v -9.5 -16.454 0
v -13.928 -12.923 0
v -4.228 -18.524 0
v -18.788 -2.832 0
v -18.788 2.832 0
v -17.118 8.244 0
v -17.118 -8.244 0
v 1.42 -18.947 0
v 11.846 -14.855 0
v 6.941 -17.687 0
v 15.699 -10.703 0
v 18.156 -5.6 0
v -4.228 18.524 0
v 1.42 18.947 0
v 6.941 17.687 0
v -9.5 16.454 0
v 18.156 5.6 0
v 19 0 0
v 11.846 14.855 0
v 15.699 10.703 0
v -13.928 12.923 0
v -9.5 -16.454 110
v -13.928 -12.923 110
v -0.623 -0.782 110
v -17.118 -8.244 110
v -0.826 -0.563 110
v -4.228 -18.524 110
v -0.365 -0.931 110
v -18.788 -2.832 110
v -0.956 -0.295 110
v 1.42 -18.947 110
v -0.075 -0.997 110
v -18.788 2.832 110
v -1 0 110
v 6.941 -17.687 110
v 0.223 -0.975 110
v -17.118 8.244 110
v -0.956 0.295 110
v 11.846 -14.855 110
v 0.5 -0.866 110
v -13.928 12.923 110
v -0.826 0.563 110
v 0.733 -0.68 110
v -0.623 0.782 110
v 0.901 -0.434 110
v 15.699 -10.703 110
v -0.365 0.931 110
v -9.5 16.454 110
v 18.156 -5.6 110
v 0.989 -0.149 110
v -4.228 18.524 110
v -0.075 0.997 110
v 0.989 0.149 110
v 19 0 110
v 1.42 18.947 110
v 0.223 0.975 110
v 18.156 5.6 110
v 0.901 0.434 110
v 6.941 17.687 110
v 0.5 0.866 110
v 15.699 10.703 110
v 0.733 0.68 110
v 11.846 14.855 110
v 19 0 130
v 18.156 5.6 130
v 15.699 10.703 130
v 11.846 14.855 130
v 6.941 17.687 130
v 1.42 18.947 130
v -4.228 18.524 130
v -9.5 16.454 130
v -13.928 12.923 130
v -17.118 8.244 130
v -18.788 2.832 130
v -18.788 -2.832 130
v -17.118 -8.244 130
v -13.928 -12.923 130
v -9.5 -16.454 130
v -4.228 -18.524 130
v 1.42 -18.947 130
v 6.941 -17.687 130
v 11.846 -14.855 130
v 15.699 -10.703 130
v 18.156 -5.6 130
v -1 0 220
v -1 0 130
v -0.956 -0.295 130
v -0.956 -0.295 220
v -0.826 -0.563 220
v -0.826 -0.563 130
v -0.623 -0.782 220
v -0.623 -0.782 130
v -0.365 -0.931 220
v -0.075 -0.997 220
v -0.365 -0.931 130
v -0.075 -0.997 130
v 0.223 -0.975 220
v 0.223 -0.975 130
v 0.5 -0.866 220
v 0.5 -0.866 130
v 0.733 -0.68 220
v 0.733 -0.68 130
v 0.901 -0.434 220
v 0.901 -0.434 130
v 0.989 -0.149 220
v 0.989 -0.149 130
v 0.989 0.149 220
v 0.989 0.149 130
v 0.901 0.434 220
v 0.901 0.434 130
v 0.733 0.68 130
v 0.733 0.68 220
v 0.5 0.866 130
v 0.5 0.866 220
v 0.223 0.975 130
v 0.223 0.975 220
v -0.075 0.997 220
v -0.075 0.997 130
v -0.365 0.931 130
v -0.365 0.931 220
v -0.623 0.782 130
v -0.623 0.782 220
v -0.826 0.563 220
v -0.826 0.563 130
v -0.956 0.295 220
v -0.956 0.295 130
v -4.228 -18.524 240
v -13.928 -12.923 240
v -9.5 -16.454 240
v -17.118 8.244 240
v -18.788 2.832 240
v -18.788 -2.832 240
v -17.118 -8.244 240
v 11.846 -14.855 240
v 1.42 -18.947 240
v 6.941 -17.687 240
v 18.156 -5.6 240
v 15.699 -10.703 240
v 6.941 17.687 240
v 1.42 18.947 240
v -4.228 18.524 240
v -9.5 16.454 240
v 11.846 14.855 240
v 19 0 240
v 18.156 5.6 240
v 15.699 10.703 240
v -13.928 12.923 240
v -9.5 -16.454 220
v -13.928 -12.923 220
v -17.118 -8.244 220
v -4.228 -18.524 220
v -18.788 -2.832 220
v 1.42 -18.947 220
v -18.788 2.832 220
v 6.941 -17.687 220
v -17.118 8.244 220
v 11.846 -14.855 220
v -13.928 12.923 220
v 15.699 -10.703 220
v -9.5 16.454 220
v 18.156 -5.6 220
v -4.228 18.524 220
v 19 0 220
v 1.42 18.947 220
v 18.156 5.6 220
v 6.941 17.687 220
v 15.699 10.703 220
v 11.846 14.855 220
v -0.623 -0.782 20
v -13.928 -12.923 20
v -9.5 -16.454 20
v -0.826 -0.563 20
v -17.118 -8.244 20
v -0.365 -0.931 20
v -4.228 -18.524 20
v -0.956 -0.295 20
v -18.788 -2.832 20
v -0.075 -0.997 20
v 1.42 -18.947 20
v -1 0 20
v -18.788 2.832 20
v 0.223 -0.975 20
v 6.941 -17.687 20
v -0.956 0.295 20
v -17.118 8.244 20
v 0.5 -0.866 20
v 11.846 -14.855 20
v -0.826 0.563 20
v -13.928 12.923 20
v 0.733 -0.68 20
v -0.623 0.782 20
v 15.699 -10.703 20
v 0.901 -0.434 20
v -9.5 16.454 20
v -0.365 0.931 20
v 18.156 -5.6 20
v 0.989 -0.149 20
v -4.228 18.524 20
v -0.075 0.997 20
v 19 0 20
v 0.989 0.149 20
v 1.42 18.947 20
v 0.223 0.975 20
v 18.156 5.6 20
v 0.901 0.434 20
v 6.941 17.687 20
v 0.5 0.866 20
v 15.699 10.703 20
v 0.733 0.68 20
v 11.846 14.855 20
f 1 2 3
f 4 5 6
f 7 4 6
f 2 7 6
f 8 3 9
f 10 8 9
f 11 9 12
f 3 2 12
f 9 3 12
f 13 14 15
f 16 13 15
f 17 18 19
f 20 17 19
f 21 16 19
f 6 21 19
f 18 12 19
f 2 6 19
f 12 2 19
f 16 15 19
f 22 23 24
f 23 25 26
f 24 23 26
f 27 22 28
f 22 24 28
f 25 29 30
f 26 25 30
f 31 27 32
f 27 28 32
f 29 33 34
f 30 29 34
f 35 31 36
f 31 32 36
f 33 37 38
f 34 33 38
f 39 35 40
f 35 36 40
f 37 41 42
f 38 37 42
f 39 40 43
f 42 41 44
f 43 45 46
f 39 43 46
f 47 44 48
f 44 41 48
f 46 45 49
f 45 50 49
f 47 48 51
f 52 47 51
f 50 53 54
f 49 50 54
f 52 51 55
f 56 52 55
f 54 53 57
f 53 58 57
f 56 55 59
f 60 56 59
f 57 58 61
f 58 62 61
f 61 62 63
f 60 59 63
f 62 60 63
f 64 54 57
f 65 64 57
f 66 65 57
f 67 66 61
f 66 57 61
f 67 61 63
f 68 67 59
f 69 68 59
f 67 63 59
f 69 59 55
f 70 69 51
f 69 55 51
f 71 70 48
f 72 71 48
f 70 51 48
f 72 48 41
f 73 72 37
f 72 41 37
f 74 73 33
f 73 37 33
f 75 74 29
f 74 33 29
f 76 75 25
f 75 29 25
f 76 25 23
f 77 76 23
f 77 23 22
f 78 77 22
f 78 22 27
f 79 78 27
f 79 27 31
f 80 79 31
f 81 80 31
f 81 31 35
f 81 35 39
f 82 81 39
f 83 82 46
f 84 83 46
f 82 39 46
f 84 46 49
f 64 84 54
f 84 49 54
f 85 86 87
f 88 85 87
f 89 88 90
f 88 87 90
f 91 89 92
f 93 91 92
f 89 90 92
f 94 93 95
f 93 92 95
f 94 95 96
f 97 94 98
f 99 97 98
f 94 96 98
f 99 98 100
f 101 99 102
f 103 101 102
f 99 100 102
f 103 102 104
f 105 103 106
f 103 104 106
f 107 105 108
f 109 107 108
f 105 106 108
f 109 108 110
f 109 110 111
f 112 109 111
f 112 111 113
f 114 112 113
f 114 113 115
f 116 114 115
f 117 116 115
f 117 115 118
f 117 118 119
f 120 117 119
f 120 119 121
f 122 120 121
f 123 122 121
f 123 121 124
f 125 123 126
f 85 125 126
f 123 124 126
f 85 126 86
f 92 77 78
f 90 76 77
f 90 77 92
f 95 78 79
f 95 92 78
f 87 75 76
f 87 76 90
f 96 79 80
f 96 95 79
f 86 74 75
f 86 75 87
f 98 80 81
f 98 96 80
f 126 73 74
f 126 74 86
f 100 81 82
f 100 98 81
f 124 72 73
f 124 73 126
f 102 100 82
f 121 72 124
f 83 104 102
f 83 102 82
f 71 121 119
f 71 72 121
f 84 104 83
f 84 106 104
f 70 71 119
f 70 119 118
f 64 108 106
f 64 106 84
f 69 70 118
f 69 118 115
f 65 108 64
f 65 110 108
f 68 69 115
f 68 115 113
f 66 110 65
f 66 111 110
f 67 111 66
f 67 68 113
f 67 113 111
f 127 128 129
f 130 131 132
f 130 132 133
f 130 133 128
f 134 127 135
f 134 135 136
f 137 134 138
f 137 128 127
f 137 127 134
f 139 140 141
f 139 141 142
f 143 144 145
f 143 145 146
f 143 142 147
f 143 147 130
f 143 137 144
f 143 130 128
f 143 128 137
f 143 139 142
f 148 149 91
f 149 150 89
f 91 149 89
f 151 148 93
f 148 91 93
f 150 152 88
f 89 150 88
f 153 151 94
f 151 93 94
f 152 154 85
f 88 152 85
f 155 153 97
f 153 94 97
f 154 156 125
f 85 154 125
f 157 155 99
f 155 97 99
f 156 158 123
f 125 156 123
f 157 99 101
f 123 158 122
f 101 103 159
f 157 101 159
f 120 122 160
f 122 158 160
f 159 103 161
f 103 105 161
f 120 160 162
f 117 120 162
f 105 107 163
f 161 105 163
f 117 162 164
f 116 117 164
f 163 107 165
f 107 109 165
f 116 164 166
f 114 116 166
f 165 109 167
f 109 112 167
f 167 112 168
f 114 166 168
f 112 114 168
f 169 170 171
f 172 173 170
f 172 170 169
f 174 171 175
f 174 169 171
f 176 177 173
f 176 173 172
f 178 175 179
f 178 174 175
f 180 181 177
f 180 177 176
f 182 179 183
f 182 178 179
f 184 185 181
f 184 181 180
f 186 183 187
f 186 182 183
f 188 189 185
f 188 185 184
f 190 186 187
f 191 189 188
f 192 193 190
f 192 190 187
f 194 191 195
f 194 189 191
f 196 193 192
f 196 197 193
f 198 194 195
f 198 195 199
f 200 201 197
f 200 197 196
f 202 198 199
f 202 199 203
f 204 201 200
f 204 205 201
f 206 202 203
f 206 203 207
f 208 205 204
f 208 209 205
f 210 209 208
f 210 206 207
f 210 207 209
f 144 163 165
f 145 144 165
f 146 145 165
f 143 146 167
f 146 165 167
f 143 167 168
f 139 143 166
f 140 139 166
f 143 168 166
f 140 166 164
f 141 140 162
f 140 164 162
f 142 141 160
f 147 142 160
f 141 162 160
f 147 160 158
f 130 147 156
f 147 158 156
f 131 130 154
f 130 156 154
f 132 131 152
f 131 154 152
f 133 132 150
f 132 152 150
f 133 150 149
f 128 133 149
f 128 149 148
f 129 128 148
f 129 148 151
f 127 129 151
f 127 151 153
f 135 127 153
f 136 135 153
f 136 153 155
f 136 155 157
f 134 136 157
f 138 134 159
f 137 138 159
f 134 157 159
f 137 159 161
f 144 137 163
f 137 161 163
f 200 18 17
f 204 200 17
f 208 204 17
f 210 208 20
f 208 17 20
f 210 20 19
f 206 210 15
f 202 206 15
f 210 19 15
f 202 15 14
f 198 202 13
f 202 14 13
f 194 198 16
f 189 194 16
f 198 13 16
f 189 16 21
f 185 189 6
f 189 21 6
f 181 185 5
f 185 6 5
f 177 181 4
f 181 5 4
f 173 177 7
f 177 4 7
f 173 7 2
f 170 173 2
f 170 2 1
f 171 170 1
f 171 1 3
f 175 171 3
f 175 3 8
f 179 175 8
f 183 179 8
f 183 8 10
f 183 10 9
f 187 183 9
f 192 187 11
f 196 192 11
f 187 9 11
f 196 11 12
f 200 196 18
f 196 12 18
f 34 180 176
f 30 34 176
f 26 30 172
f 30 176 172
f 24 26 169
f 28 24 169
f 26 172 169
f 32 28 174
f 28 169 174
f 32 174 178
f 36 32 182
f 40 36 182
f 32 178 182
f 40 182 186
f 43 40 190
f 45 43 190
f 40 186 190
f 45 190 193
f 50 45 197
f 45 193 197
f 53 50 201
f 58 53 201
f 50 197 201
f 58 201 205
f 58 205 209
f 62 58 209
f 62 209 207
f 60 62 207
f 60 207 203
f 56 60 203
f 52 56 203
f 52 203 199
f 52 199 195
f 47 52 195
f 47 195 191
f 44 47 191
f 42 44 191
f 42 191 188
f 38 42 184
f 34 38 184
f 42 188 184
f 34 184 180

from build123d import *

# Parameters (mm, degrees)
SKETCH_1_R      = 19
EXTRUDE_1_DEPTH = 20
SKETCH_2_R      = 1
EXTRUDE_2_DEPTH = 90
SKETCH_3_R      = 19
EXTRUDE_3_DEPTH = 20
SKETCH_4_R      = 1
EXTRUDE_4_DEPTH = 90
SKETCH_5_R      = 19
EXTRUDE_5_DEPTH = 20


with BuildPart() as part:
    # 草图1 → 凸台-拉伸1 (new body)
    with BuildSketch(Plane.XY):
        Circle(SKETCH_1_R)
    extrude(amount=EXTRUDE_1_DEPTH)

    # 草图2 → 凸台-拉伸2 (add)
    with BuildSketch(Plane.XY.offset(20)):
        with Locations(Location((0, 0, 0), (0, 0, 180))):
            Circle(SKETCH_2_R)
    extrude(amount=EXTRUDE_2_DEPTH)

    # 草图3 → 凸台-拉伸3 (add)
    with BuildSketch(Plane.XY.offset(110)):
        Circle(SKETCH_3_R)
    extrude(amount=EXTRUDE_3_DEPTH)

    # 草图4 → 凸台-拉伸4 (add)
    with BuildSketch(Plane.XY.offset(130)):
        with Locations(Location((0, 0, 0), (0, 0, 180))):
            Circle(SKETCH_4_R)
    extrude(amount=EXTRUDE_4_DEPTH)

    # 草图5 → 凸台-拉伸5 (add)
    with BuildSketch(Plane.XY.offset(220)):
        Circle(SKETCH_5_R)
    extrude(amount=EXTRUDE_5_DEPTH)


solid = part.part
